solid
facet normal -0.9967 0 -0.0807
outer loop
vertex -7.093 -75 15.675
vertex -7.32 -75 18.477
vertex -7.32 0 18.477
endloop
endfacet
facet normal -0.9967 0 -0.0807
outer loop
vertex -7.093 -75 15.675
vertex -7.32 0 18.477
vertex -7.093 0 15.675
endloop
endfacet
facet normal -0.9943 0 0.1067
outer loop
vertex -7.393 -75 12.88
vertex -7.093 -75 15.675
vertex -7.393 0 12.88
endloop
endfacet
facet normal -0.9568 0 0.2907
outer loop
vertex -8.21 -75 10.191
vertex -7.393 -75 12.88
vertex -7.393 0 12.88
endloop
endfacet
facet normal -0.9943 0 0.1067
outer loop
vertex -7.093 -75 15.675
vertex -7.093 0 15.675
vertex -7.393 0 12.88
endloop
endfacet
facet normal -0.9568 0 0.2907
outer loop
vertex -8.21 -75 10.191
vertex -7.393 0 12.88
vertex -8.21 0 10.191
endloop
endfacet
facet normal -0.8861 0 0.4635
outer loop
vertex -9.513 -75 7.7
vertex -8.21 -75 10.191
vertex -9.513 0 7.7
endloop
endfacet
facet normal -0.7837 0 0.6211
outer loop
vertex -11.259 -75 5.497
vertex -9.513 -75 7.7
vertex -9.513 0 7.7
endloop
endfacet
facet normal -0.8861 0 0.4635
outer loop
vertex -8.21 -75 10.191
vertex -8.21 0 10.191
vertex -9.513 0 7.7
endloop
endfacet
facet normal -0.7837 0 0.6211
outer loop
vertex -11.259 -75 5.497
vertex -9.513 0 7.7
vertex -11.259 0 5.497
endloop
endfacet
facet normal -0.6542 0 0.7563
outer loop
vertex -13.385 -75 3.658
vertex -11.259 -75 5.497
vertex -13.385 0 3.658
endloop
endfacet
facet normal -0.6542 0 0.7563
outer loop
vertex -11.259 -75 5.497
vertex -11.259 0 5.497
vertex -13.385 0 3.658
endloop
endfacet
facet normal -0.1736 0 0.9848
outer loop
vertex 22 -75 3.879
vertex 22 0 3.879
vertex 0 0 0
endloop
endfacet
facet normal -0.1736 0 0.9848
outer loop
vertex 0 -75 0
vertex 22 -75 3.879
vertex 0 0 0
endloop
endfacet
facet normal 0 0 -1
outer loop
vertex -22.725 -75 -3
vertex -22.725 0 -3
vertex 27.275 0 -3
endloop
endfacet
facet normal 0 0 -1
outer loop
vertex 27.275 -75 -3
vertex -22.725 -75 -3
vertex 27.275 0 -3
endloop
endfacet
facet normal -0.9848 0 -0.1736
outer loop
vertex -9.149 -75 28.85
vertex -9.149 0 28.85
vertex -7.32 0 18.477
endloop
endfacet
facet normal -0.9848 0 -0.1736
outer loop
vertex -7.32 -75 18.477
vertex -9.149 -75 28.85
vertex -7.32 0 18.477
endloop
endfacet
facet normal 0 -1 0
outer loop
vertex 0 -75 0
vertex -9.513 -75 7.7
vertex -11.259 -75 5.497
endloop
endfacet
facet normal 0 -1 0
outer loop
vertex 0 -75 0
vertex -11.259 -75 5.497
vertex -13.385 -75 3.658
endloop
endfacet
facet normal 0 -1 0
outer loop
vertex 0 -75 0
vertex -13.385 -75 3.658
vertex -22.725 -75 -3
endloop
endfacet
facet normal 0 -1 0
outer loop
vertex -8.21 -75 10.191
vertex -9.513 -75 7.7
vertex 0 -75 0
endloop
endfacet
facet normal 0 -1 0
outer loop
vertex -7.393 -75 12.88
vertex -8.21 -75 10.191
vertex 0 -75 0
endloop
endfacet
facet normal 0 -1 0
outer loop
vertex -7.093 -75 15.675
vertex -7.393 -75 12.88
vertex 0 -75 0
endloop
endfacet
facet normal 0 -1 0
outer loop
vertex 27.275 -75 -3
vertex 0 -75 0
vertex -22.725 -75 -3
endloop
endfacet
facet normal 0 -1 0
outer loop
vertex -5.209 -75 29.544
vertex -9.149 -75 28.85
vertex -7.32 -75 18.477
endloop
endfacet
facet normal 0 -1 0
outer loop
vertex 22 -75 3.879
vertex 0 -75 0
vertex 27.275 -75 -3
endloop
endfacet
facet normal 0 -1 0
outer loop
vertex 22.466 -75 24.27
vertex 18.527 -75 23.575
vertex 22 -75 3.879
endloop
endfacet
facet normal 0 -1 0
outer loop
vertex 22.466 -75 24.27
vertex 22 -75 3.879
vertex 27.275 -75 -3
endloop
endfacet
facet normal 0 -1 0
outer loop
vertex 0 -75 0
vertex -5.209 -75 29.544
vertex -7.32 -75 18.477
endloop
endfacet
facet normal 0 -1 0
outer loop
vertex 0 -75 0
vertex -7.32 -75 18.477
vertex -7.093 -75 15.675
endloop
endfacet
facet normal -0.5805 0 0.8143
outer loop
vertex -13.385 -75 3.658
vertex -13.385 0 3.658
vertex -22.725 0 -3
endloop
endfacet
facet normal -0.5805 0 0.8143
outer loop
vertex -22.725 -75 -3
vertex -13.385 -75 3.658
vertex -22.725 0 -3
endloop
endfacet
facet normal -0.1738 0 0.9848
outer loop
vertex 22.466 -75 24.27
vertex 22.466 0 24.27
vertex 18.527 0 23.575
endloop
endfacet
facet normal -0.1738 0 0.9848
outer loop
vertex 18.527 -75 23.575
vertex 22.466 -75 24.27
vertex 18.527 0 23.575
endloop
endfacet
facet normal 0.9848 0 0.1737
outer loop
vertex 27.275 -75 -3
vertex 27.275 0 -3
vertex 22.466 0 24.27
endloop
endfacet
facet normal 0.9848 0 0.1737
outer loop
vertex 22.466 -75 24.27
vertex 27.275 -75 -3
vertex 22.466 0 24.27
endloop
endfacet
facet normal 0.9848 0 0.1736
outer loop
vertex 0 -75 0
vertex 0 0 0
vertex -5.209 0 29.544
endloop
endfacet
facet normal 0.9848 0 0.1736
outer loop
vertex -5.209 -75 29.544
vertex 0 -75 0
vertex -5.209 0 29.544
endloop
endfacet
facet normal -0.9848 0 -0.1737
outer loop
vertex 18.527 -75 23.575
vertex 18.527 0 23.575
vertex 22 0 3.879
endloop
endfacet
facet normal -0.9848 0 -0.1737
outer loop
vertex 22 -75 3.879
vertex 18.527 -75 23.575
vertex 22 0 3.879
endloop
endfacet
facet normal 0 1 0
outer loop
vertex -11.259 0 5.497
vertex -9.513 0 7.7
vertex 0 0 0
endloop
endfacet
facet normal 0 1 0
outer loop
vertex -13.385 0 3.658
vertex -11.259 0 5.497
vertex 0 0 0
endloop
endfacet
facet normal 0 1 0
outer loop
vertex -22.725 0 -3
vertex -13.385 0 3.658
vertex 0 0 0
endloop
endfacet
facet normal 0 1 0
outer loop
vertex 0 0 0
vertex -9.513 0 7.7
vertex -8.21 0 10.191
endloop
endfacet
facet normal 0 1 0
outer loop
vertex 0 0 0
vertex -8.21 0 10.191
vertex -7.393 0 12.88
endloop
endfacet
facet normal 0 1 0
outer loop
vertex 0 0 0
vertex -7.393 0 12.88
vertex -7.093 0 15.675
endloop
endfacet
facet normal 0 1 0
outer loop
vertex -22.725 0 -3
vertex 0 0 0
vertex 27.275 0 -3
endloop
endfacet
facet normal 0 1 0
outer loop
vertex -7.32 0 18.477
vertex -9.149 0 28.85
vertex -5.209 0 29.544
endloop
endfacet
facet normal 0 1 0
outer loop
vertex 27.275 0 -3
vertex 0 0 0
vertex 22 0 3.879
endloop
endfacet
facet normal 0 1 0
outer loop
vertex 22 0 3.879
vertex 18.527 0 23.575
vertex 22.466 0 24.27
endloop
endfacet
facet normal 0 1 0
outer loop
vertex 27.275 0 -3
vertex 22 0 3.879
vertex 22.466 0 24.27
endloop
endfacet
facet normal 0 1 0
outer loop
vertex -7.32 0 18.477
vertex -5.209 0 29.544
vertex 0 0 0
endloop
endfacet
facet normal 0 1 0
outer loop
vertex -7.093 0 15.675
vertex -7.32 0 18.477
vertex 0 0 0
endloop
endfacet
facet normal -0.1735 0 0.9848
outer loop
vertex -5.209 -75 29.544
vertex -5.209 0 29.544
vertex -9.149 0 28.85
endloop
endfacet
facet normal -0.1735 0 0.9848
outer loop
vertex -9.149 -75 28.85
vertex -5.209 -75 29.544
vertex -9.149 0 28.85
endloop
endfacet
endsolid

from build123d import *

# Parameters (mm, degrees)
F1_DEPTH = 75


with BuildPart() as f1:
    # F0 (on Front) → F1 (new body)
    with BuildSketch(Plane.XZ):
        with BuildLine():
            Line((22, 3.879194), (0, 0))
            Line((0, 0), (-5.209445, 29.544233))
            Line((-5.209445, 29.544233), (-9.148676, 28.84964))
            Line((-9.148676, 28.84964), (-7.319728, 18.477157))
            ThreePointArc((-7.319728, 18.477157), (-8.209606, 10.190581), (-13.385038, 3.658036))
            Line((-13.385038, 3.658036), (-22.725306, -3))
            Line((-22.725306, -3), (27.274694, -3))
            Line((27.274694, -3), (22.466267, 24.269941))
            Line((22.466267, 24.269941), (18.527036, 23.575349))
            Line((18.527036, 23.575349), (22, 3.879194))
        make_face()
    extrude(amount=F1_DEPTH)


solid = f1.part
